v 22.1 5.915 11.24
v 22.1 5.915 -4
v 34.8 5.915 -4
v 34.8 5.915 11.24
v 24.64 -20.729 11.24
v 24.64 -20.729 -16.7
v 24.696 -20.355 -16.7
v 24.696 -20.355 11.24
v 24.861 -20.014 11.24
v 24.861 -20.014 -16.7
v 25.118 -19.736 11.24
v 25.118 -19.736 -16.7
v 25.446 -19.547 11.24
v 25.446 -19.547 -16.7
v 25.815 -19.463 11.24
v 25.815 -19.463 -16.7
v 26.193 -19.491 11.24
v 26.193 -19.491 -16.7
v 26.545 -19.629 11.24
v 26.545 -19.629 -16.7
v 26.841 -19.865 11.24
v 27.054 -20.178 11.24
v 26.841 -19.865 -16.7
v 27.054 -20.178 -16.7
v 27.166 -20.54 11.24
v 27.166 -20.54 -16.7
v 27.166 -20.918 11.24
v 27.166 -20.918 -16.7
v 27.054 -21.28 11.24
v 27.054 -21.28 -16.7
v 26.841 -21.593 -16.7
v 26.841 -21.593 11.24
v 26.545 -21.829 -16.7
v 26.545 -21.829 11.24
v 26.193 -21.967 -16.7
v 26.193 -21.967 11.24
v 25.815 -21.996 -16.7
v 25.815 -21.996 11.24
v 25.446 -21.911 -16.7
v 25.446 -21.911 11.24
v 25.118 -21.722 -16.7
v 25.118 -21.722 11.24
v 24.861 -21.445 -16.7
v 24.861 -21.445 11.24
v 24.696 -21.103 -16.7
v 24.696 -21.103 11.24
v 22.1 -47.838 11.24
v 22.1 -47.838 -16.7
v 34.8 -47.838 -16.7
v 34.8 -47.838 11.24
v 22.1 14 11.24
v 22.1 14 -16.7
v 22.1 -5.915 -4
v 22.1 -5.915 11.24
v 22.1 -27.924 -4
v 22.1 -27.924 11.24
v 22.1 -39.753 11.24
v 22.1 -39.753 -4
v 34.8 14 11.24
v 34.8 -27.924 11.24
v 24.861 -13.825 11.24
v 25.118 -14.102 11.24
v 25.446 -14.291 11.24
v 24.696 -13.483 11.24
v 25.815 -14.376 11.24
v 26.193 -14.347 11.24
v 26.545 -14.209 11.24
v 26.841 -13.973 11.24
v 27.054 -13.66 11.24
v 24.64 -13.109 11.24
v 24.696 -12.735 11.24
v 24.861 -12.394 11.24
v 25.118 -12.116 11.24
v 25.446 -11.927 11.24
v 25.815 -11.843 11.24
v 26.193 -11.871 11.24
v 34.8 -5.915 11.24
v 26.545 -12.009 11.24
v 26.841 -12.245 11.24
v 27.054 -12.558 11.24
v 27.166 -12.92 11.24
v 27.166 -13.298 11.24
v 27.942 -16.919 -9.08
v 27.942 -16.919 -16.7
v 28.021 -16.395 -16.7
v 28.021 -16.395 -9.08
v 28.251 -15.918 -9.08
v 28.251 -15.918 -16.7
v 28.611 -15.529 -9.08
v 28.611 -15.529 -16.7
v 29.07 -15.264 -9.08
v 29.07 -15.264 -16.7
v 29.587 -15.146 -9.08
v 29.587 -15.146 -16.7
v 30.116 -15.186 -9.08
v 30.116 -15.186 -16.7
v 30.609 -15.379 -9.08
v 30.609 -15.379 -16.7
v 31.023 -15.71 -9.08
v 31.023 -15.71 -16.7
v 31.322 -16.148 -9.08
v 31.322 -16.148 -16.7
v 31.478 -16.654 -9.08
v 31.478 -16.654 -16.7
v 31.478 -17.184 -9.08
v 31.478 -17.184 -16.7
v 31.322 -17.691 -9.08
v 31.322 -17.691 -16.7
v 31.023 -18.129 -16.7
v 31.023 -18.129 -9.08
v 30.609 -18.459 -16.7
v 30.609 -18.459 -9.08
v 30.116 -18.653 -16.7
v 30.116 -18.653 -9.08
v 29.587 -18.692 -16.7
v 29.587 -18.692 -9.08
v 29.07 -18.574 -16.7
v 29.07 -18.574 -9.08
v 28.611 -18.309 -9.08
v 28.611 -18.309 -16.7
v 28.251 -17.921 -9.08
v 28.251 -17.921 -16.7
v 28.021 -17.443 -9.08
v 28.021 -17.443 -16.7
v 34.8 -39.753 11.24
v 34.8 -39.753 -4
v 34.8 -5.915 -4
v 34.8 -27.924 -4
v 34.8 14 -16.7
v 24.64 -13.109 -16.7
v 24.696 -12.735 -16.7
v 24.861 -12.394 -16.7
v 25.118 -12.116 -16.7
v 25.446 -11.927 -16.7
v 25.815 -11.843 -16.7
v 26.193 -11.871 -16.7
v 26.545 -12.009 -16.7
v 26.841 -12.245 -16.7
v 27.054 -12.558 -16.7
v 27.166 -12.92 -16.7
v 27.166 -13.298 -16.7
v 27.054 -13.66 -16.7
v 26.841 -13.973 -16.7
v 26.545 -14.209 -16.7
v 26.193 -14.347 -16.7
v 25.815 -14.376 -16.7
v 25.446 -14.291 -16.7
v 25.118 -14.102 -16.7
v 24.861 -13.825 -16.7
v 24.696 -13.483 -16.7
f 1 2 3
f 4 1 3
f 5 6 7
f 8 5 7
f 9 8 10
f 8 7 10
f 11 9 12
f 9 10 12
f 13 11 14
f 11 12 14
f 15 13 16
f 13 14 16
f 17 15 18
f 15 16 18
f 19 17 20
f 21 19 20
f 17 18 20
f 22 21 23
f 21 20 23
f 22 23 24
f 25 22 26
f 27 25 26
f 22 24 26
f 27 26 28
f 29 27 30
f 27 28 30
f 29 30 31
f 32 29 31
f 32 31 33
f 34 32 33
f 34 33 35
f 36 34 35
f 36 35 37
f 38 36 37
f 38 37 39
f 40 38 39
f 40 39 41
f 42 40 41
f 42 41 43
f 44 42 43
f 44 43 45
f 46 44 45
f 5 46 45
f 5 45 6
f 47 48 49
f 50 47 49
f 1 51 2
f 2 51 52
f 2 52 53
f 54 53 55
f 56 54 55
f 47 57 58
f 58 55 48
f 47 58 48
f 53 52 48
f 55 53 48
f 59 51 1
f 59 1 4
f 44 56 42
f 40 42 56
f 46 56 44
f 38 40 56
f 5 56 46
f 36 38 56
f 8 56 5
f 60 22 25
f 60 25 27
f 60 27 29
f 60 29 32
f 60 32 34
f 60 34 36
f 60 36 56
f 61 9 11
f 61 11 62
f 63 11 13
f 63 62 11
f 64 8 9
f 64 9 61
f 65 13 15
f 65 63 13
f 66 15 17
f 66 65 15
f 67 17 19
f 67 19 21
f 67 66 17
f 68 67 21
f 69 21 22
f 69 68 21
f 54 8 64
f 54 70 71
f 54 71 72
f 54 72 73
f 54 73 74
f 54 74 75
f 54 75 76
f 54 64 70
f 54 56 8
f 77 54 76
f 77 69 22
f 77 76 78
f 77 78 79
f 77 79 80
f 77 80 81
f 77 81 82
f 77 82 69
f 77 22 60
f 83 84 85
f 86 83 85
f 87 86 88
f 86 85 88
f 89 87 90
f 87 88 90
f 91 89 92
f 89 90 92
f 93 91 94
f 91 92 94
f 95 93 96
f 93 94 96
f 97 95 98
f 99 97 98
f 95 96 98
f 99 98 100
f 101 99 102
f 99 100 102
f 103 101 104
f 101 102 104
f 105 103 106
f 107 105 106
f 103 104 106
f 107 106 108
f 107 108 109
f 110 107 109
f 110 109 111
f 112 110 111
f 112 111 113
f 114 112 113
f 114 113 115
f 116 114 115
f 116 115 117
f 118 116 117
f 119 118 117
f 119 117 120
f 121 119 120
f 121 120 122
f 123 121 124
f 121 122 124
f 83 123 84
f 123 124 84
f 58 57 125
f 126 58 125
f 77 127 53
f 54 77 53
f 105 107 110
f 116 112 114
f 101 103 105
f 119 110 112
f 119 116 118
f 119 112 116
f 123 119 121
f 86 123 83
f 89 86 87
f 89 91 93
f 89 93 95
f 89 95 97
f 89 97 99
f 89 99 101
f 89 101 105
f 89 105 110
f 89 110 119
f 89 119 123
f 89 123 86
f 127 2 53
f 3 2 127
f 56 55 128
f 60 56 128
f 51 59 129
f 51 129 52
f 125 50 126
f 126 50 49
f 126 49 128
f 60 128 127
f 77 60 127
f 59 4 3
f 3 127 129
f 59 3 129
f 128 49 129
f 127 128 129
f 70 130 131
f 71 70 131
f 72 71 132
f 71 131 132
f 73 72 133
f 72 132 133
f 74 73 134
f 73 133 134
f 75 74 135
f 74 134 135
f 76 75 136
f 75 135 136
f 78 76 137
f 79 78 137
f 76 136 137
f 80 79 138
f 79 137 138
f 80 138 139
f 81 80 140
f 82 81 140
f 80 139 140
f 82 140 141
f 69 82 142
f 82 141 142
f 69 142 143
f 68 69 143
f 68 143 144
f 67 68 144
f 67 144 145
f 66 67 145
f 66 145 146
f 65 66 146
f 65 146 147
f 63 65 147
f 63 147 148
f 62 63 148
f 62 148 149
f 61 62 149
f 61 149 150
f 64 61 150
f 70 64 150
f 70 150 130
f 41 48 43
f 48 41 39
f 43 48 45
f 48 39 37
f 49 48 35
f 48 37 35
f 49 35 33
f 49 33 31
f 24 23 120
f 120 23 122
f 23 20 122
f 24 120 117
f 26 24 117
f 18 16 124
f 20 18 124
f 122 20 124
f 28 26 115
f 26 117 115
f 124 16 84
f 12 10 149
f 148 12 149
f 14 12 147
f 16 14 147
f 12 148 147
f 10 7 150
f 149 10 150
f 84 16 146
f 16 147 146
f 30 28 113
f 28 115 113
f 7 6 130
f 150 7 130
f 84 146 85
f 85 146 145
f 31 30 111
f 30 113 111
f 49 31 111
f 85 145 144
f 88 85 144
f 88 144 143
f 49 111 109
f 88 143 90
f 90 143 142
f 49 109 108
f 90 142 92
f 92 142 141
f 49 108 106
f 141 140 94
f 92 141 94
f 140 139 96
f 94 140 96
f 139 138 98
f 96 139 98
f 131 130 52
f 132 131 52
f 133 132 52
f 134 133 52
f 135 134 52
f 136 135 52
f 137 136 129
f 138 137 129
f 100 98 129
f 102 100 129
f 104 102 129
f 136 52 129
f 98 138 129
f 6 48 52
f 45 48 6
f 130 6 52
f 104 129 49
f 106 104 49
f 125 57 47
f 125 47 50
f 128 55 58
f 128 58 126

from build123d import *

# Parameters (mm, degrees)
BOSS_EXTRUDE1_START = -4
SKETCH2_W           = 12.7
SKETCH2_H           = 11.829112303
SKETCH2_H_2         = 8.085443848
BOSS_EXTRUDE1_DEPTH = 12.7
BOSS_EXTRUDE3_START = -4
SKETCH2_4_W         = 12.7
SKETCH2_4_H         = 8.085443848
BOSS_EXTRUDE3_DEPTH = 15.24
SKETCH3_R           = 1.778
CUT_EXTRUDE1_DEPTH  = 7.62
SKETCH3_3_R         = 1.27
CUT_EXTRUDE2_DEPTH  = 66.423141131


with BuildPart() as part:
    # Sketch2 → Boss-Extrude1 (new body)
    with BuildSketch(Plane.XY.offset(BOSS_EXTRUDE1_START)):
        with BuildLine():
            Line((34.8, 12), (34.8, 14))
            Line((34.8, 14), (22.1, 14))
            Line((22.1, 14), (22.1, 5.914556152))
            Line((22.1, 5.914556152), (32.8, 5.914556152))
            ThreePointArc((32.8, 5.914556152), (34.214213562, 6.500342589), (34.8, 7.914556152))
            Line((34.8, 7.914556152), (34.8, 12))
        make_face()
        Polygon((32.8, 5.914556152), (22.1, 5.914556152), (22.1, -5.914556152), (32.8, -5.914556152), (34.8, -5.914556152), (34.8, 5.914556152), align=None)
        with BuildLine():
            Line((32.8, -5.914556152), (22.1, -5.914556152))
            Line((22.1, -5.914556152), (22.1, -27.923752717))
            Line((22.1, -27.923752717), (34.8, -27.923752717))
            Line((34.8, -27.923752717), (34.8, -12))
            Line((34.8, -12), (34.8, -7.914556152))
            ThreePointArc((34.8, -7.914556152), (34.214213562, -6.500342589), (32.8, -5.914556152))
        make_face()
        with Locations((28.45, -33.838308869)):
            Rectangle(SKETCH2_W, SKETCH2_H)
        with Locations((28.45, -43.795586944)):
            Rectangle(SKETCH2_W, SKETCH2_H_2)
        with BuildLine():
            Line((34.8, 5.914556152), (34.8, 7.914556152))
            ThreePointArc((34.8, 7.914556152), (34.214213562, 6.500342589), (32.8, 5.914556152))
            Line((32.8, 5.914556152), (34.8, 5.914556152))
        make_face()
        with BuildLine():
            Line((34.8, -5.914556152), (32.8, -5.914556152))
            ThreePointArc((32.8, -5.914556152), (34.214213562, -6.500342589), (34.8, -7.914556152))
            Line((34.8, -7.914556152), (34.8, -5.914556152))
        make_face()
    extrude(amount=-BOSS_EXTRUDE1_DEPTH)

    # Sketch2<4> → Boss-Extrude3 (add)
    with BuildSketch(Plane.XY.offset(BOSS_EXTRUDE3_START)):
        with BuildLine():
            Line((34.8, 12), (34.8, 14))
            Line((34.8, 14), (22.1, 14))
            Line((22.1, 14), (22.1, 5.914556152))
            Line((22.1, 5.914556152), (32.8, 5.914556152))
            ThreePointArc((32.8, 5.914556152), (34.214213562, 6.500342589), (34.8, 7.914556152))
            Line((34.8, 7.914556152), (34.8, 12))
        make_face()
        with BuildLine():
            Line((34.8, 5.914556152), (34.8, 7.914556152))
            ThreePointArc((34.8, 7.914556152), (34.214213562, 6.500342589), (32.8, 5.914556152))
            Line((32.8, 5.914556152), (34.8, 5.914556152))
        make_face()
        with BuildLine():
            Line((32.8, -5.914556152), (22.1, -5.914556152))
            Line((22.1, -5.914556152), (22.1, -27.923752717))
            Line((22.1, -27.923752717), (34.8, -27.923752717))
            Line((34.8, -27.923752717), (34.8, -12))
            Line((34.8, -12), (34.8, -7.914556152))
            ThreePointArc((34.8, -7.914556152), (34.214213562, -6.500342589), (32.8, -5.914556152))
        make_face()
        with BuildLine():
            Line((34.8, -5.914556152), (32.8, -5.914556152))
            ThreePointArc((32.8, -5.914556152), (34.214213562, -6.500342589), (34.8, -7.914556152))
            Line((34.8, -7.914556152), (34.8, -5.914556152))
        make_face()
        with Locations((28.45, -43.795586944)):
            Rectangle(SKETCH2_4_W, SKETCH2_4_H)
    extrude(amount=BOSS_EXTRUDE3_DEPTH)

    # Sketch3 → Cut-Extrude1 (cut)
    with BuildSketch(Plane(origin=(0, 0, -16.7), x_dir=(-1, 0, 0), z_dir=(0, 0, -1))):
        with Locations((-29.72, -16.919154434)):
            Circle(SKETCH3_R)
    extrude(amount=-CUT_EXTRUDE1_DEPTH, mode=Mode.SUBTRACT)

    # Sketch3<3> → Cut-Extrude2 (cut, through all)
    with BuildSketch(Plane(origin=(0, 0, -16.7), x_dir=(-1, 0, 0), z_dir=(0, 0, -1))):
        with Locations((-25.91, -13.109154434)):
            Circle(SKETCH3_3_R)
        with Locations((-25.91, -20.729154434)):
            Circle(SKETCH3_3_R)
    extrude(amount=-CUT_EXTRUDE2_DEPTH, mode=Mode.SUBTRACT)


solid = part.part
